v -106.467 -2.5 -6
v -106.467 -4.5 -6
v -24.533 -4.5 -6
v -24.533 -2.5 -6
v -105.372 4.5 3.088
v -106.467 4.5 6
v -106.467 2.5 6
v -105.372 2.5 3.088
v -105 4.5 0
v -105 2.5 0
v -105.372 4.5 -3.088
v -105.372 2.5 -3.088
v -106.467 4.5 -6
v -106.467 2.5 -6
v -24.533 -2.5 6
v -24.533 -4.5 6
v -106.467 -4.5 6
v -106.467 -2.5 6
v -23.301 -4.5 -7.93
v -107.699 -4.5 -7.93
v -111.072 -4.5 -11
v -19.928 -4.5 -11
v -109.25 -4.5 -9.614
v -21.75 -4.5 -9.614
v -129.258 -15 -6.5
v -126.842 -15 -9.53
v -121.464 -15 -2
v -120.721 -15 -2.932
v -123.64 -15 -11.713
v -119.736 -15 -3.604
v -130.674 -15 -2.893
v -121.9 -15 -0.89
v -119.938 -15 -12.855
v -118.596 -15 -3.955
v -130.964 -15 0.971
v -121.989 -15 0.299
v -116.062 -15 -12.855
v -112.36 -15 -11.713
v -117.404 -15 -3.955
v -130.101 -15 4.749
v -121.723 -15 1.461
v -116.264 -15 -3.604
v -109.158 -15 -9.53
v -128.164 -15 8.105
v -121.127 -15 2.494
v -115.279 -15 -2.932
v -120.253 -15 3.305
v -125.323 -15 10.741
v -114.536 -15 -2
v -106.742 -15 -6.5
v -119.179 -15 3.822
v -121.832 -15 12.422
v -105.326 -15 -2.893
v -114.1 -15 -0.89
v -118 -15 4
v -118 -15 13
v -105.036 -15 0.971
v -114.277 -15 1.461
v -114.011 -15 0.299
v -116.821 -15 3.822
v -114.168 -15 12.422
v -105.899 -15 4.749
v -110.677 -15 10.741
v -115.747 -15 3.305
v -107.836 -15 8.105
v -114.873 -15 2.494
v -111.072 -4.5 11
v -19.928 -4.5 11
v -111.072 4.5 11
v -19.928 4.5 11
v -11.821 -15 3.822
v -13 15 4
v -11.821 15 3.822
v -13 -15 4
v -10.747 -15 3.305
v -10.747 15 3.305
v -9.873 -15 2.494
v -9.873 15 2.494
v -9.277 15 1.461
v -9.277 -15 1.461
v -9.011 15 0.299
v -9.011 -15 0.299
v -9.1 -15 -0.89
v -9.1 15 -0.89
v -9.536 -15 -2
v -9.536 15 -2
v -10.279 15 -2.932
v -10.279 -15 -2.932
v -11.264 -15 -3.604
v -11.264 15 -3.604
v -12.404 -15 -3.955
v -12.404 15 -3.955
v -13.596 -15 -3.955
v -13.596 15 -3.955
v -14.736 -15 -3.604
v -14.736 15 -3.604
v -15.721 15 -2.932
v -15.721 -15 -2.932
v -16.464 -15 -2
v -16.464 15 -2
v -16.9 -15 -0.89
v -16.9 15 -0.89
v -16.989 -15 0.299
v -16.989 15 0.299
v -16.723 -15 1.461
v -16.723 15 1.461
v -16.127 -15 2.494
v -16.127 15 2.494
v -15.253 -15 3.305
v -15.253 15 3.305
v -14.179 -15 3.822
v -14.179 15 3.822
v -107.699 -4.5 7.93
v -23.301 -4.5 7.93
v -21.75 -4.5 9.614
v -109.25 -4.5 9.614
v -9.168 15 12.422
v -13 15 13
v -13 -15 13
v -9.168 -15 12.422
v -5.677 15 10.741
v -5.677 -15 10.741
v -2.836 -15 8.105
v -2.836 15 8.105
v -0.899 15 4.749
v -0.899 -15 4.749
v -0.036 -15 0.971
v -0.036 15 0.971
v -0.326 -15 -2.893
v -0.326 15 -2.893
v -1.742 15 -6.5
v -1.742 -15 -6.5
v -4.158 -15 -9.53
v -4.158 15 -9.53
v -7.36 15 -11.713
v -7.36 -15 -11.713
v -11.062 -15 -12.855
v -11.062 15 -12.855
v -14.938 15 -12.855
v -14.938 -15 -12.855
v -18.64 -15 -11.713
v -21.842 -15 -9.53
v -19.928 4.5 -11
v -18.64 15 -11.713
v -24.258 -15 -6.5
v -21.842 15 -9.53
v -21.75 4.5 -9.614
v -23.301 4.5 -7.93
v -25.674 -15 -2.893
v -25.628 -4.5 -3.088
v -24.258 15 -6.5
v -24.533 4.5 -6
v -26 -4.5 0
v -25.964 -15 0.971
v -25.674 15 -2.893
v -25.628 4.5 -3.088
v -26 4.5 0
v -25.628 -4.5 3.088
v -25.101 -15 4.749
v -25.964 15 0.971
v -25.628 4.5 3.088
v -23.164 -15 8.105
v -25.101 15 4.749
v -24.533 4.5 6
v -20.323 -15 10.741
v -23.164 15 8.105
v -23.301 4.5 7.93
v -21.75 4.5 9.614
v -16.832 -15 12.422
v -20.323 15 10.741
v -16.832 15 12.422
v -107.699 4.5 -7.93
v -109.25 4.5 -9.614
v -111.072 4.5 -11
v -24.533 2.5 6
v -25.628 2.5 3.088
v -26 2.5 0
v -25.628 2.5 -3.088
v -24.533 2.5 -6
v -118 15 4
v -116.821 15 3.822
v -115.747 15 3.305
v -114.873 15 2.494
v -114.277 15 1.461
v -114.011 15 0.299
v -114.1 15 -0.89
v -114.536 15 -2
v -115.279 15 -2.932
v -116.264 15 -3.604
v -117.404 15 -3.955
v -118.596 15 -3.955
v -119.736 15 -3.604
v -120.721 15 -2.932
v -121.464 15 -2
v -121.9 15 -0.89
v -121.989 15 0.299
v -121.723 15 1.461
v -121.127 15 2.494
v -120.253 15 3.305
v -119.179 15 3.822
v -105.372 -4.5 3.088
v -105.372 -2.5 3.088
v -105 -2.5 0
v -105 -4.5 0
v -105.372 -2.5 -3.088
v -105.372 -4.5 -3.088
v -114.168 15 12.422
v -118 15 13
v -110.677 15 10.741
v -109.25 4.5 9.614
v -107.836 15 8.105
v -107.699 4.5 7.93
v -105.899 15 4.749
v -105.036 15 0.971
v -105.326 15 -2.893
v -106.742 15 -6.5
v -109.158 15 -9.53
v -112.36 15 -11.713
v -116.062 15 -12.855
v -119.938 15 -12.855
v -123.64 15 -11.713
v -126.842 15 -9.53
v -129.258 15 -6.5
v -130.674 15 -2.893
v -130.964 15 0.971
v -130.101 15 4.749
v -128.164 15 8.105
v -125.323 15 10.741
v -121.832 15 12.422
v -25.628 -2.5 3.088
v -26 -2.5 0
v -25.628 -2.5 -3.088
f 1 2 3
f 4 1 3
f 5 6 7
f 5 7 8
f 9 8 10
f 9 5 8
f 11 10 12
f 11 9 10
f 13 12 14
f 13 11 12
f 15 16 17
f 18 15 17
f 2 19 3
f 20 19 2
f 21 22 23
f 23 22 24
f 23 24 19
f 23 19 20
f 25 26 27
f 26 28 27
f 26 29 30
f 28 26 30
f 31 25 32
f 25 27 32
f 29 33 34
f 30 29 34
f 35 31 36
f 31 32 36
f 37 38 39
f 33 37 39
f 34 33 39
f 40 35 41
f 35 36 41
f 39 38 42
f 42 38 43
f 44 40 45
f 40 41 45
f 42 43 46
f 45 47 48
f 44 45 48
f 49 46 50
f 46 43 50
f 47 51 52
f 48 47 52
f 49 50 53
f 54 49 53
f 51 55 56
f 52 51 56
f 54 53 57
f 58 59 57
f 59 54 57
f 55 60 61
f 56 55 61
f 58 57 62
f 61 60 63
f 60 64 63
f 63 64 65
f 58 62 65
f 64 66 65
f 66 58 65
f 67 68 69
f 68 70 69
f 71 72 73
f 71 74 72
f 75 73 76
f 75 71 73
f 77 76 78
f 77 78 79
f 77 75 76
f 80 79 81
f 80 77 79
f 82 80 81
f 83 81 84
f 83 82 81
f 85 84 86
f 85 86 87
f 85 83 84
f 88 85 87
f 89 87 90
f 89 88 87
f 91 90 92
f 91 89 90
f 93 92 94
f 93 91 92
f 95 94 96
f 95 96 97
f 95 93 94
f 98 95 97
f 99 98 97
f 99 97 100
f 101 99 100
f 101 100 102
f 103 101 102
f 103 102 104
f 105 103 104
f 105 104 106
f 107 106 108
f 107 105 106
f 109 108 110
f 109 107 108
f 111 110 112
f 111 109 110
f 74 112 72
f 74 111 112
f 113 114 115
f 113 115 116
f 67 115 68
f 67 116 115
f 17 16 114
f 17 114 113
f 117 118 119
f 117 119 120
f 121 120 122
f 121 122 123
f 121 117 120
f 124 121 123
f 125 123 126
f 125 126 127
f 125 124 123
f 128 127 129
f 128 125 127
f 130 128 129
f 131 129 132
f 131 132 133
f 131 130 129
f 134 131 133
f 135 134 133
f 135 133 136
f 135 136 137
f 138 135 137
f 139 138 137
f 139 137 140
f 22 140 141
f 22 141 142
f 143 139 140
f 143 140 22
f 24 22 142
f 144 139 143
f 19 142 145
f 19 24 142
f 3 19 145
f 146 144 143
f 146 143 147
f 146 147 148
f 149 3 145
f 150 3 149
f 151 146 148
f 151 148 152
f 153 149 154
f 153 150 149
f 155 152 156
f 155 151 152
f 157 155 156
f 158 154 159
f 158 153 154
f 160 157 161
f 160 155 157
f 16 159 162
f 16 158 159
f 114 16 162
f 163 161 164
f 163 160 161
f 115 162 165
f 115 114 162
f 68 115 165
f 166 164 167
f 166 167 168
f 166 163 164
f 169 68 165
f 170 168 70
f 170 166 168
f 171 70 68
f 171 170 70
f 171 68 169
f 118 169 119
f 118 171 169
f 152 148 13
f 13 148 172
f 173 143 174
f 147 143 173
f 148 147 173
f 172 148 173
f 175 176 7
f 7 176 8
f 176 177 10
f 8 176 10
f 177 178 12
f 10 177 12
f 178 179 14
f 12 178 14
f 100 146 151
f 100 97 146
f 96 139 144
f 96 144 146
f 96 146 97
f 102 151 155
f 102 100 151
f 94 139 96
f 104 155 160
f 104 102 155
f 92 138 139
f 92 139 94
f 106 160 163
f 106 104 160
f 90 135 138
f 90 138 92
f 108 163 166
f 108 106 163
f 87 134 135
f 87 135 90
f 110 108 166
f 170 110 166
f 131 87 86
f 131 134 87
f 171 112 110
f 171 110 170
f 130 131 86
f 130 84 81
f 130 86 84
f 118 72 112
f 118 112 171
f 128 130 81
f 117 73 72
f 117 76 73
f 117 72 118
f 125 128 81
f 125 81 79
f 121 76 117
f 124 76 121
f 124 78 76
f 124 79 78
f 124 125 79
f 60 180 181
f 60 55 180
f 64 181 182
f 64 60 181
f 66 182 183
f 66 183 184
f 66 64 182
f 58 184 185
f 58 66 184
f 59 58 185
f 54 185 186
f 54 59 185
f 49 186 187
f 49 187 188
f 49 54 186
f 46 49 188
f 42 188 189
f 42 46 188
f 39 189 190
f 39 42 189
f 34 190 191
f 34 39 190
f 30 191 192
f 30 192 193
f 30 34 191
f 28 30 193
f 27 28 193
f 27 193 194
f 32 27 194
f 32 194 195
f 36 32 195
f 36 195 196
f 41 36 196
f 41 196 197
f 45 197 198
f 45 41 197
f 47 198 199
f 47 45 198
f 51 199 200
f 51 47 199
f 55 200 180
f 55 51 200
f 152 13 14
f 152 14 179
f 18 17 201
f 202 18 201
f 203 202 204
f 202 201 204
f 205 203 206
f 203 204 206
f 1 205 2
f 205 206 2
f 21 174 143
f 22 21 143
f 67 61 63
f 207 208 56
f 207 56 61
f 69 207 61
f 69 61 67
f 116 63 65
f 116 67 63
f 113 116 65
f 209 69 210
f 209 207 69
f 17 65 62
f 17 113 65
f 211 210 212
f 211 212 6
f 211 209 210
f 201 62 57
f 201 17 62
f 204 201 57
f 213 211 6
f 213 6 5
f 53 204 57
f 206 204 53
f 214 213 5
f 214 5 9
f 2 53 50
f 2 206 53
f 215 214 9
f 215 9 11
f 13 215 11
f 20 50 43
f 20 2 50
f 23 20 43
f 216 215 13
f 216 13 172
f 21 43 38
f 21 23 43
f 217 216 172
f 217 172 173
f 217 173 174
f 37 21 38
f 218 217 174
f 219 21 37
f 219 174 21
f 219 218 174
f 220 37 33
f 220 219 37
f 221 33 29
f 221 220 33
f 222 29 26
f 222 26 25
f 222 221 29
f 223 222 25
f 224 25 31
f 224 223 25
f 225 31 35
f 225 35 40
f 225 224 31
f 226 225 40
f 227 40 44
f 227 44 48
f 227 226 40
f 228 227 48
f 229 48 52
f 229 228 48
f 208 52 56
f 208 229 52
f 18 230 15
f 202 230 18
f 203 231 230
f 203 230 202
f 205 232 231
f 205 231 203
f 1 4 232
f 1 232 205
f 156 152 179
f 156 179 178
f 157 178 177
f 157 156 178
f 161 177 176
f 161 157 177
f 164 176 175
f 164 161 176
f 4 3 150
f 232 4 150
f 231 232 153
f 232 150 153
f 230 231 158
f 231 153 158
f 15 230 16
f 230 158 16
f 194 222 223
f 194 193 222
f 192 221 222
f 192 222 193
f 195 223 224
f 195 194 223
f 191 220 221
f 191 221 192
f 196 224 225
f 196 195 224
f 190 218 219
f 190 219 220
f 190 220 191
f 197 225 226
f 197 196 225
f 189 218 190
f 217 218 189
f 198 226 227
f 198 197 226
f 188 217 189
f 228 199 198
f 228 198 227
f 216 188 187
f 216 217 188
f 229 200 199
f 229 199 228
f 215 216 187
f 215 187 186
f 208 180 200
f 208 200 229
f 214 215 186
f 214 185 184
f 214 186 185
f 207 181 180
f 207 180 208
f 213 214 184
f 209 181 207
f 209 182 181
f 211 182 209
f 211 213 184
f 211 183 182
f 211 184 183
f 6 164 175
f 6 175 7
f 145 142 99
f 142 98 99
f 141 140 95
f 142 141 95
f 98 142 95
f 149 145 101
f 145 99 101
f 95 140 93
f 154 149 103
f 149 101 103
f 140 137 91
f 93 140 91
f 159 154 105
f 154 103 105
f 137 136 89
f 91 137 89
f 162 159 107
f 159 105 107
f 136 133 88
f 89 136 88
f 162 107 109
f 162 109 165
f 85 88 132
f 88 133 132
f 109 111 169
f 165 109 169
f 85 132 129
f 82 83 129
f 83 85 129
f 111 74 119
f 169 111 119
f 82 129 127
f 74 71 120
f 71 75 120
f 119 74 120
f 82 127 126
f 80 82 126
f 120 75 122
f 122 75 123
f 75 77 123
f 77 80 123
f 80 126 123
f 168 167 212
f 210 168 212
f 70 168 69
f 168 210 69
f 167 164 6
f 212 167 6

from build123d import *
from build123d.topology import SkipClean

# Parameters (mm, degrees)
SKETCH_1_R          = 13
SKETCH_1_R_2        = 4
EXTRUDE_1_DEPTH     = 15
EXTRUDE_1_2_DEPTH   = 15
EXTRUDE_2_DEPTH     = 4.5
CUT_EXTRUDE_1_DEPTH = 2


with BuildPart() as part:
    # Эскиз1 → Бобышка-Вытянуть1 (new, symmetric)
    with BuildSketch(Plane(origin=(0, 0, 0), x_dir=(1, 0, 0), z_dir=(0, 1, 0))):
        with Locations(Location((-118, 0, 0), (0, 0, 270))):
            Circle(SKETCH_1_R)
        with Locations(Location((-118, 0, 0), (0, 0, 270))):
            Circle(SKETCH_1_R_2, mode=Mode.SUBTRACT)
    extrude(amount=EXTRUDE_1_DEPTH, both=True)



with BuildPart() as body_2:
    # Эскиз1 → Extrude 1 2 (new, symmetric)
    with BuildSketch(Plane(origin=(0, 0, 0), x_dir=(1, 0, 0), z_dir=(0, 1, 0))):
        with Locations(Location((-13, 0, 0), (0, 0, 270))):
            Circle(SKETCH_1_R)
        with Locations(Location((-13, 0, 0), (0, 0, 270))):
            Circle(SKETCH_1_R_2, mode=Mode.SUBTRACT)
    extrude(amount=EXTRUDE_1_2_DEPTH, both=True)


with BuildPart() as part_1:
    add(part.part)

    add(body_2.part)  # Бобышка-Вытянуть2 merges body 2
    # Эскиз2 → Бобышка-Вытянуть2 (add, symmetric)
    with BuildSketch(Plane(origin=(0, 0, 0), x_dir=(1, 0, 0), z_dir=(0, 1, 0))):
        with BuildLine():
            Line((-111.07179677, 11), (-19.92820323, 11))
            ThreePointArc((-19.92820323, 11), (-26, 0), (-19.92820323, -11))
            Line((-19.92820323, -11), (-111.07179677, -11))
            ThreePointArc((-111.07179677, -11), (-105, 0), (-111.07179677, 11))
        make_face()
    extrude(amount=EXTRUDE_2_DEPTH, both=True)

    # Эскиз4 → Вырез-Вытянуть1 (cut)
    with SkipClean():  # the faces are left unmerged after this step: merging them gives an invalid solid
        with BuildSketch(Plane(origin=(0, 4.5, 0), x_dir=(1, 0, 0), z_dir=(0, 1, 0))):
            with BuildLine():
                Line((-106.467437405, 6), (-24.532562595, 6))
                ThreePointArc((-24.532562595, 6), (-26, 0), (-24.532562595, -6))
                Line((-24.532562595, -6), (-106.467437405, -6))
                ThreePointArc((-106.467437405, -6), (-105, 0), (-106.467437405, 6))
            make_face()
        cut_extrude_1 = extrude(amount=-CUT_EXTRUDE_1_DEPTH, mode=Mode.SUBTRACT)

    # Зеркальное отражение1: Вырез-Вытянуть1 across plane
    add(cut_extrude_1.mirror(Plane.ZX), mode=Mode.SUBTRACT)


solid = part_1.part
